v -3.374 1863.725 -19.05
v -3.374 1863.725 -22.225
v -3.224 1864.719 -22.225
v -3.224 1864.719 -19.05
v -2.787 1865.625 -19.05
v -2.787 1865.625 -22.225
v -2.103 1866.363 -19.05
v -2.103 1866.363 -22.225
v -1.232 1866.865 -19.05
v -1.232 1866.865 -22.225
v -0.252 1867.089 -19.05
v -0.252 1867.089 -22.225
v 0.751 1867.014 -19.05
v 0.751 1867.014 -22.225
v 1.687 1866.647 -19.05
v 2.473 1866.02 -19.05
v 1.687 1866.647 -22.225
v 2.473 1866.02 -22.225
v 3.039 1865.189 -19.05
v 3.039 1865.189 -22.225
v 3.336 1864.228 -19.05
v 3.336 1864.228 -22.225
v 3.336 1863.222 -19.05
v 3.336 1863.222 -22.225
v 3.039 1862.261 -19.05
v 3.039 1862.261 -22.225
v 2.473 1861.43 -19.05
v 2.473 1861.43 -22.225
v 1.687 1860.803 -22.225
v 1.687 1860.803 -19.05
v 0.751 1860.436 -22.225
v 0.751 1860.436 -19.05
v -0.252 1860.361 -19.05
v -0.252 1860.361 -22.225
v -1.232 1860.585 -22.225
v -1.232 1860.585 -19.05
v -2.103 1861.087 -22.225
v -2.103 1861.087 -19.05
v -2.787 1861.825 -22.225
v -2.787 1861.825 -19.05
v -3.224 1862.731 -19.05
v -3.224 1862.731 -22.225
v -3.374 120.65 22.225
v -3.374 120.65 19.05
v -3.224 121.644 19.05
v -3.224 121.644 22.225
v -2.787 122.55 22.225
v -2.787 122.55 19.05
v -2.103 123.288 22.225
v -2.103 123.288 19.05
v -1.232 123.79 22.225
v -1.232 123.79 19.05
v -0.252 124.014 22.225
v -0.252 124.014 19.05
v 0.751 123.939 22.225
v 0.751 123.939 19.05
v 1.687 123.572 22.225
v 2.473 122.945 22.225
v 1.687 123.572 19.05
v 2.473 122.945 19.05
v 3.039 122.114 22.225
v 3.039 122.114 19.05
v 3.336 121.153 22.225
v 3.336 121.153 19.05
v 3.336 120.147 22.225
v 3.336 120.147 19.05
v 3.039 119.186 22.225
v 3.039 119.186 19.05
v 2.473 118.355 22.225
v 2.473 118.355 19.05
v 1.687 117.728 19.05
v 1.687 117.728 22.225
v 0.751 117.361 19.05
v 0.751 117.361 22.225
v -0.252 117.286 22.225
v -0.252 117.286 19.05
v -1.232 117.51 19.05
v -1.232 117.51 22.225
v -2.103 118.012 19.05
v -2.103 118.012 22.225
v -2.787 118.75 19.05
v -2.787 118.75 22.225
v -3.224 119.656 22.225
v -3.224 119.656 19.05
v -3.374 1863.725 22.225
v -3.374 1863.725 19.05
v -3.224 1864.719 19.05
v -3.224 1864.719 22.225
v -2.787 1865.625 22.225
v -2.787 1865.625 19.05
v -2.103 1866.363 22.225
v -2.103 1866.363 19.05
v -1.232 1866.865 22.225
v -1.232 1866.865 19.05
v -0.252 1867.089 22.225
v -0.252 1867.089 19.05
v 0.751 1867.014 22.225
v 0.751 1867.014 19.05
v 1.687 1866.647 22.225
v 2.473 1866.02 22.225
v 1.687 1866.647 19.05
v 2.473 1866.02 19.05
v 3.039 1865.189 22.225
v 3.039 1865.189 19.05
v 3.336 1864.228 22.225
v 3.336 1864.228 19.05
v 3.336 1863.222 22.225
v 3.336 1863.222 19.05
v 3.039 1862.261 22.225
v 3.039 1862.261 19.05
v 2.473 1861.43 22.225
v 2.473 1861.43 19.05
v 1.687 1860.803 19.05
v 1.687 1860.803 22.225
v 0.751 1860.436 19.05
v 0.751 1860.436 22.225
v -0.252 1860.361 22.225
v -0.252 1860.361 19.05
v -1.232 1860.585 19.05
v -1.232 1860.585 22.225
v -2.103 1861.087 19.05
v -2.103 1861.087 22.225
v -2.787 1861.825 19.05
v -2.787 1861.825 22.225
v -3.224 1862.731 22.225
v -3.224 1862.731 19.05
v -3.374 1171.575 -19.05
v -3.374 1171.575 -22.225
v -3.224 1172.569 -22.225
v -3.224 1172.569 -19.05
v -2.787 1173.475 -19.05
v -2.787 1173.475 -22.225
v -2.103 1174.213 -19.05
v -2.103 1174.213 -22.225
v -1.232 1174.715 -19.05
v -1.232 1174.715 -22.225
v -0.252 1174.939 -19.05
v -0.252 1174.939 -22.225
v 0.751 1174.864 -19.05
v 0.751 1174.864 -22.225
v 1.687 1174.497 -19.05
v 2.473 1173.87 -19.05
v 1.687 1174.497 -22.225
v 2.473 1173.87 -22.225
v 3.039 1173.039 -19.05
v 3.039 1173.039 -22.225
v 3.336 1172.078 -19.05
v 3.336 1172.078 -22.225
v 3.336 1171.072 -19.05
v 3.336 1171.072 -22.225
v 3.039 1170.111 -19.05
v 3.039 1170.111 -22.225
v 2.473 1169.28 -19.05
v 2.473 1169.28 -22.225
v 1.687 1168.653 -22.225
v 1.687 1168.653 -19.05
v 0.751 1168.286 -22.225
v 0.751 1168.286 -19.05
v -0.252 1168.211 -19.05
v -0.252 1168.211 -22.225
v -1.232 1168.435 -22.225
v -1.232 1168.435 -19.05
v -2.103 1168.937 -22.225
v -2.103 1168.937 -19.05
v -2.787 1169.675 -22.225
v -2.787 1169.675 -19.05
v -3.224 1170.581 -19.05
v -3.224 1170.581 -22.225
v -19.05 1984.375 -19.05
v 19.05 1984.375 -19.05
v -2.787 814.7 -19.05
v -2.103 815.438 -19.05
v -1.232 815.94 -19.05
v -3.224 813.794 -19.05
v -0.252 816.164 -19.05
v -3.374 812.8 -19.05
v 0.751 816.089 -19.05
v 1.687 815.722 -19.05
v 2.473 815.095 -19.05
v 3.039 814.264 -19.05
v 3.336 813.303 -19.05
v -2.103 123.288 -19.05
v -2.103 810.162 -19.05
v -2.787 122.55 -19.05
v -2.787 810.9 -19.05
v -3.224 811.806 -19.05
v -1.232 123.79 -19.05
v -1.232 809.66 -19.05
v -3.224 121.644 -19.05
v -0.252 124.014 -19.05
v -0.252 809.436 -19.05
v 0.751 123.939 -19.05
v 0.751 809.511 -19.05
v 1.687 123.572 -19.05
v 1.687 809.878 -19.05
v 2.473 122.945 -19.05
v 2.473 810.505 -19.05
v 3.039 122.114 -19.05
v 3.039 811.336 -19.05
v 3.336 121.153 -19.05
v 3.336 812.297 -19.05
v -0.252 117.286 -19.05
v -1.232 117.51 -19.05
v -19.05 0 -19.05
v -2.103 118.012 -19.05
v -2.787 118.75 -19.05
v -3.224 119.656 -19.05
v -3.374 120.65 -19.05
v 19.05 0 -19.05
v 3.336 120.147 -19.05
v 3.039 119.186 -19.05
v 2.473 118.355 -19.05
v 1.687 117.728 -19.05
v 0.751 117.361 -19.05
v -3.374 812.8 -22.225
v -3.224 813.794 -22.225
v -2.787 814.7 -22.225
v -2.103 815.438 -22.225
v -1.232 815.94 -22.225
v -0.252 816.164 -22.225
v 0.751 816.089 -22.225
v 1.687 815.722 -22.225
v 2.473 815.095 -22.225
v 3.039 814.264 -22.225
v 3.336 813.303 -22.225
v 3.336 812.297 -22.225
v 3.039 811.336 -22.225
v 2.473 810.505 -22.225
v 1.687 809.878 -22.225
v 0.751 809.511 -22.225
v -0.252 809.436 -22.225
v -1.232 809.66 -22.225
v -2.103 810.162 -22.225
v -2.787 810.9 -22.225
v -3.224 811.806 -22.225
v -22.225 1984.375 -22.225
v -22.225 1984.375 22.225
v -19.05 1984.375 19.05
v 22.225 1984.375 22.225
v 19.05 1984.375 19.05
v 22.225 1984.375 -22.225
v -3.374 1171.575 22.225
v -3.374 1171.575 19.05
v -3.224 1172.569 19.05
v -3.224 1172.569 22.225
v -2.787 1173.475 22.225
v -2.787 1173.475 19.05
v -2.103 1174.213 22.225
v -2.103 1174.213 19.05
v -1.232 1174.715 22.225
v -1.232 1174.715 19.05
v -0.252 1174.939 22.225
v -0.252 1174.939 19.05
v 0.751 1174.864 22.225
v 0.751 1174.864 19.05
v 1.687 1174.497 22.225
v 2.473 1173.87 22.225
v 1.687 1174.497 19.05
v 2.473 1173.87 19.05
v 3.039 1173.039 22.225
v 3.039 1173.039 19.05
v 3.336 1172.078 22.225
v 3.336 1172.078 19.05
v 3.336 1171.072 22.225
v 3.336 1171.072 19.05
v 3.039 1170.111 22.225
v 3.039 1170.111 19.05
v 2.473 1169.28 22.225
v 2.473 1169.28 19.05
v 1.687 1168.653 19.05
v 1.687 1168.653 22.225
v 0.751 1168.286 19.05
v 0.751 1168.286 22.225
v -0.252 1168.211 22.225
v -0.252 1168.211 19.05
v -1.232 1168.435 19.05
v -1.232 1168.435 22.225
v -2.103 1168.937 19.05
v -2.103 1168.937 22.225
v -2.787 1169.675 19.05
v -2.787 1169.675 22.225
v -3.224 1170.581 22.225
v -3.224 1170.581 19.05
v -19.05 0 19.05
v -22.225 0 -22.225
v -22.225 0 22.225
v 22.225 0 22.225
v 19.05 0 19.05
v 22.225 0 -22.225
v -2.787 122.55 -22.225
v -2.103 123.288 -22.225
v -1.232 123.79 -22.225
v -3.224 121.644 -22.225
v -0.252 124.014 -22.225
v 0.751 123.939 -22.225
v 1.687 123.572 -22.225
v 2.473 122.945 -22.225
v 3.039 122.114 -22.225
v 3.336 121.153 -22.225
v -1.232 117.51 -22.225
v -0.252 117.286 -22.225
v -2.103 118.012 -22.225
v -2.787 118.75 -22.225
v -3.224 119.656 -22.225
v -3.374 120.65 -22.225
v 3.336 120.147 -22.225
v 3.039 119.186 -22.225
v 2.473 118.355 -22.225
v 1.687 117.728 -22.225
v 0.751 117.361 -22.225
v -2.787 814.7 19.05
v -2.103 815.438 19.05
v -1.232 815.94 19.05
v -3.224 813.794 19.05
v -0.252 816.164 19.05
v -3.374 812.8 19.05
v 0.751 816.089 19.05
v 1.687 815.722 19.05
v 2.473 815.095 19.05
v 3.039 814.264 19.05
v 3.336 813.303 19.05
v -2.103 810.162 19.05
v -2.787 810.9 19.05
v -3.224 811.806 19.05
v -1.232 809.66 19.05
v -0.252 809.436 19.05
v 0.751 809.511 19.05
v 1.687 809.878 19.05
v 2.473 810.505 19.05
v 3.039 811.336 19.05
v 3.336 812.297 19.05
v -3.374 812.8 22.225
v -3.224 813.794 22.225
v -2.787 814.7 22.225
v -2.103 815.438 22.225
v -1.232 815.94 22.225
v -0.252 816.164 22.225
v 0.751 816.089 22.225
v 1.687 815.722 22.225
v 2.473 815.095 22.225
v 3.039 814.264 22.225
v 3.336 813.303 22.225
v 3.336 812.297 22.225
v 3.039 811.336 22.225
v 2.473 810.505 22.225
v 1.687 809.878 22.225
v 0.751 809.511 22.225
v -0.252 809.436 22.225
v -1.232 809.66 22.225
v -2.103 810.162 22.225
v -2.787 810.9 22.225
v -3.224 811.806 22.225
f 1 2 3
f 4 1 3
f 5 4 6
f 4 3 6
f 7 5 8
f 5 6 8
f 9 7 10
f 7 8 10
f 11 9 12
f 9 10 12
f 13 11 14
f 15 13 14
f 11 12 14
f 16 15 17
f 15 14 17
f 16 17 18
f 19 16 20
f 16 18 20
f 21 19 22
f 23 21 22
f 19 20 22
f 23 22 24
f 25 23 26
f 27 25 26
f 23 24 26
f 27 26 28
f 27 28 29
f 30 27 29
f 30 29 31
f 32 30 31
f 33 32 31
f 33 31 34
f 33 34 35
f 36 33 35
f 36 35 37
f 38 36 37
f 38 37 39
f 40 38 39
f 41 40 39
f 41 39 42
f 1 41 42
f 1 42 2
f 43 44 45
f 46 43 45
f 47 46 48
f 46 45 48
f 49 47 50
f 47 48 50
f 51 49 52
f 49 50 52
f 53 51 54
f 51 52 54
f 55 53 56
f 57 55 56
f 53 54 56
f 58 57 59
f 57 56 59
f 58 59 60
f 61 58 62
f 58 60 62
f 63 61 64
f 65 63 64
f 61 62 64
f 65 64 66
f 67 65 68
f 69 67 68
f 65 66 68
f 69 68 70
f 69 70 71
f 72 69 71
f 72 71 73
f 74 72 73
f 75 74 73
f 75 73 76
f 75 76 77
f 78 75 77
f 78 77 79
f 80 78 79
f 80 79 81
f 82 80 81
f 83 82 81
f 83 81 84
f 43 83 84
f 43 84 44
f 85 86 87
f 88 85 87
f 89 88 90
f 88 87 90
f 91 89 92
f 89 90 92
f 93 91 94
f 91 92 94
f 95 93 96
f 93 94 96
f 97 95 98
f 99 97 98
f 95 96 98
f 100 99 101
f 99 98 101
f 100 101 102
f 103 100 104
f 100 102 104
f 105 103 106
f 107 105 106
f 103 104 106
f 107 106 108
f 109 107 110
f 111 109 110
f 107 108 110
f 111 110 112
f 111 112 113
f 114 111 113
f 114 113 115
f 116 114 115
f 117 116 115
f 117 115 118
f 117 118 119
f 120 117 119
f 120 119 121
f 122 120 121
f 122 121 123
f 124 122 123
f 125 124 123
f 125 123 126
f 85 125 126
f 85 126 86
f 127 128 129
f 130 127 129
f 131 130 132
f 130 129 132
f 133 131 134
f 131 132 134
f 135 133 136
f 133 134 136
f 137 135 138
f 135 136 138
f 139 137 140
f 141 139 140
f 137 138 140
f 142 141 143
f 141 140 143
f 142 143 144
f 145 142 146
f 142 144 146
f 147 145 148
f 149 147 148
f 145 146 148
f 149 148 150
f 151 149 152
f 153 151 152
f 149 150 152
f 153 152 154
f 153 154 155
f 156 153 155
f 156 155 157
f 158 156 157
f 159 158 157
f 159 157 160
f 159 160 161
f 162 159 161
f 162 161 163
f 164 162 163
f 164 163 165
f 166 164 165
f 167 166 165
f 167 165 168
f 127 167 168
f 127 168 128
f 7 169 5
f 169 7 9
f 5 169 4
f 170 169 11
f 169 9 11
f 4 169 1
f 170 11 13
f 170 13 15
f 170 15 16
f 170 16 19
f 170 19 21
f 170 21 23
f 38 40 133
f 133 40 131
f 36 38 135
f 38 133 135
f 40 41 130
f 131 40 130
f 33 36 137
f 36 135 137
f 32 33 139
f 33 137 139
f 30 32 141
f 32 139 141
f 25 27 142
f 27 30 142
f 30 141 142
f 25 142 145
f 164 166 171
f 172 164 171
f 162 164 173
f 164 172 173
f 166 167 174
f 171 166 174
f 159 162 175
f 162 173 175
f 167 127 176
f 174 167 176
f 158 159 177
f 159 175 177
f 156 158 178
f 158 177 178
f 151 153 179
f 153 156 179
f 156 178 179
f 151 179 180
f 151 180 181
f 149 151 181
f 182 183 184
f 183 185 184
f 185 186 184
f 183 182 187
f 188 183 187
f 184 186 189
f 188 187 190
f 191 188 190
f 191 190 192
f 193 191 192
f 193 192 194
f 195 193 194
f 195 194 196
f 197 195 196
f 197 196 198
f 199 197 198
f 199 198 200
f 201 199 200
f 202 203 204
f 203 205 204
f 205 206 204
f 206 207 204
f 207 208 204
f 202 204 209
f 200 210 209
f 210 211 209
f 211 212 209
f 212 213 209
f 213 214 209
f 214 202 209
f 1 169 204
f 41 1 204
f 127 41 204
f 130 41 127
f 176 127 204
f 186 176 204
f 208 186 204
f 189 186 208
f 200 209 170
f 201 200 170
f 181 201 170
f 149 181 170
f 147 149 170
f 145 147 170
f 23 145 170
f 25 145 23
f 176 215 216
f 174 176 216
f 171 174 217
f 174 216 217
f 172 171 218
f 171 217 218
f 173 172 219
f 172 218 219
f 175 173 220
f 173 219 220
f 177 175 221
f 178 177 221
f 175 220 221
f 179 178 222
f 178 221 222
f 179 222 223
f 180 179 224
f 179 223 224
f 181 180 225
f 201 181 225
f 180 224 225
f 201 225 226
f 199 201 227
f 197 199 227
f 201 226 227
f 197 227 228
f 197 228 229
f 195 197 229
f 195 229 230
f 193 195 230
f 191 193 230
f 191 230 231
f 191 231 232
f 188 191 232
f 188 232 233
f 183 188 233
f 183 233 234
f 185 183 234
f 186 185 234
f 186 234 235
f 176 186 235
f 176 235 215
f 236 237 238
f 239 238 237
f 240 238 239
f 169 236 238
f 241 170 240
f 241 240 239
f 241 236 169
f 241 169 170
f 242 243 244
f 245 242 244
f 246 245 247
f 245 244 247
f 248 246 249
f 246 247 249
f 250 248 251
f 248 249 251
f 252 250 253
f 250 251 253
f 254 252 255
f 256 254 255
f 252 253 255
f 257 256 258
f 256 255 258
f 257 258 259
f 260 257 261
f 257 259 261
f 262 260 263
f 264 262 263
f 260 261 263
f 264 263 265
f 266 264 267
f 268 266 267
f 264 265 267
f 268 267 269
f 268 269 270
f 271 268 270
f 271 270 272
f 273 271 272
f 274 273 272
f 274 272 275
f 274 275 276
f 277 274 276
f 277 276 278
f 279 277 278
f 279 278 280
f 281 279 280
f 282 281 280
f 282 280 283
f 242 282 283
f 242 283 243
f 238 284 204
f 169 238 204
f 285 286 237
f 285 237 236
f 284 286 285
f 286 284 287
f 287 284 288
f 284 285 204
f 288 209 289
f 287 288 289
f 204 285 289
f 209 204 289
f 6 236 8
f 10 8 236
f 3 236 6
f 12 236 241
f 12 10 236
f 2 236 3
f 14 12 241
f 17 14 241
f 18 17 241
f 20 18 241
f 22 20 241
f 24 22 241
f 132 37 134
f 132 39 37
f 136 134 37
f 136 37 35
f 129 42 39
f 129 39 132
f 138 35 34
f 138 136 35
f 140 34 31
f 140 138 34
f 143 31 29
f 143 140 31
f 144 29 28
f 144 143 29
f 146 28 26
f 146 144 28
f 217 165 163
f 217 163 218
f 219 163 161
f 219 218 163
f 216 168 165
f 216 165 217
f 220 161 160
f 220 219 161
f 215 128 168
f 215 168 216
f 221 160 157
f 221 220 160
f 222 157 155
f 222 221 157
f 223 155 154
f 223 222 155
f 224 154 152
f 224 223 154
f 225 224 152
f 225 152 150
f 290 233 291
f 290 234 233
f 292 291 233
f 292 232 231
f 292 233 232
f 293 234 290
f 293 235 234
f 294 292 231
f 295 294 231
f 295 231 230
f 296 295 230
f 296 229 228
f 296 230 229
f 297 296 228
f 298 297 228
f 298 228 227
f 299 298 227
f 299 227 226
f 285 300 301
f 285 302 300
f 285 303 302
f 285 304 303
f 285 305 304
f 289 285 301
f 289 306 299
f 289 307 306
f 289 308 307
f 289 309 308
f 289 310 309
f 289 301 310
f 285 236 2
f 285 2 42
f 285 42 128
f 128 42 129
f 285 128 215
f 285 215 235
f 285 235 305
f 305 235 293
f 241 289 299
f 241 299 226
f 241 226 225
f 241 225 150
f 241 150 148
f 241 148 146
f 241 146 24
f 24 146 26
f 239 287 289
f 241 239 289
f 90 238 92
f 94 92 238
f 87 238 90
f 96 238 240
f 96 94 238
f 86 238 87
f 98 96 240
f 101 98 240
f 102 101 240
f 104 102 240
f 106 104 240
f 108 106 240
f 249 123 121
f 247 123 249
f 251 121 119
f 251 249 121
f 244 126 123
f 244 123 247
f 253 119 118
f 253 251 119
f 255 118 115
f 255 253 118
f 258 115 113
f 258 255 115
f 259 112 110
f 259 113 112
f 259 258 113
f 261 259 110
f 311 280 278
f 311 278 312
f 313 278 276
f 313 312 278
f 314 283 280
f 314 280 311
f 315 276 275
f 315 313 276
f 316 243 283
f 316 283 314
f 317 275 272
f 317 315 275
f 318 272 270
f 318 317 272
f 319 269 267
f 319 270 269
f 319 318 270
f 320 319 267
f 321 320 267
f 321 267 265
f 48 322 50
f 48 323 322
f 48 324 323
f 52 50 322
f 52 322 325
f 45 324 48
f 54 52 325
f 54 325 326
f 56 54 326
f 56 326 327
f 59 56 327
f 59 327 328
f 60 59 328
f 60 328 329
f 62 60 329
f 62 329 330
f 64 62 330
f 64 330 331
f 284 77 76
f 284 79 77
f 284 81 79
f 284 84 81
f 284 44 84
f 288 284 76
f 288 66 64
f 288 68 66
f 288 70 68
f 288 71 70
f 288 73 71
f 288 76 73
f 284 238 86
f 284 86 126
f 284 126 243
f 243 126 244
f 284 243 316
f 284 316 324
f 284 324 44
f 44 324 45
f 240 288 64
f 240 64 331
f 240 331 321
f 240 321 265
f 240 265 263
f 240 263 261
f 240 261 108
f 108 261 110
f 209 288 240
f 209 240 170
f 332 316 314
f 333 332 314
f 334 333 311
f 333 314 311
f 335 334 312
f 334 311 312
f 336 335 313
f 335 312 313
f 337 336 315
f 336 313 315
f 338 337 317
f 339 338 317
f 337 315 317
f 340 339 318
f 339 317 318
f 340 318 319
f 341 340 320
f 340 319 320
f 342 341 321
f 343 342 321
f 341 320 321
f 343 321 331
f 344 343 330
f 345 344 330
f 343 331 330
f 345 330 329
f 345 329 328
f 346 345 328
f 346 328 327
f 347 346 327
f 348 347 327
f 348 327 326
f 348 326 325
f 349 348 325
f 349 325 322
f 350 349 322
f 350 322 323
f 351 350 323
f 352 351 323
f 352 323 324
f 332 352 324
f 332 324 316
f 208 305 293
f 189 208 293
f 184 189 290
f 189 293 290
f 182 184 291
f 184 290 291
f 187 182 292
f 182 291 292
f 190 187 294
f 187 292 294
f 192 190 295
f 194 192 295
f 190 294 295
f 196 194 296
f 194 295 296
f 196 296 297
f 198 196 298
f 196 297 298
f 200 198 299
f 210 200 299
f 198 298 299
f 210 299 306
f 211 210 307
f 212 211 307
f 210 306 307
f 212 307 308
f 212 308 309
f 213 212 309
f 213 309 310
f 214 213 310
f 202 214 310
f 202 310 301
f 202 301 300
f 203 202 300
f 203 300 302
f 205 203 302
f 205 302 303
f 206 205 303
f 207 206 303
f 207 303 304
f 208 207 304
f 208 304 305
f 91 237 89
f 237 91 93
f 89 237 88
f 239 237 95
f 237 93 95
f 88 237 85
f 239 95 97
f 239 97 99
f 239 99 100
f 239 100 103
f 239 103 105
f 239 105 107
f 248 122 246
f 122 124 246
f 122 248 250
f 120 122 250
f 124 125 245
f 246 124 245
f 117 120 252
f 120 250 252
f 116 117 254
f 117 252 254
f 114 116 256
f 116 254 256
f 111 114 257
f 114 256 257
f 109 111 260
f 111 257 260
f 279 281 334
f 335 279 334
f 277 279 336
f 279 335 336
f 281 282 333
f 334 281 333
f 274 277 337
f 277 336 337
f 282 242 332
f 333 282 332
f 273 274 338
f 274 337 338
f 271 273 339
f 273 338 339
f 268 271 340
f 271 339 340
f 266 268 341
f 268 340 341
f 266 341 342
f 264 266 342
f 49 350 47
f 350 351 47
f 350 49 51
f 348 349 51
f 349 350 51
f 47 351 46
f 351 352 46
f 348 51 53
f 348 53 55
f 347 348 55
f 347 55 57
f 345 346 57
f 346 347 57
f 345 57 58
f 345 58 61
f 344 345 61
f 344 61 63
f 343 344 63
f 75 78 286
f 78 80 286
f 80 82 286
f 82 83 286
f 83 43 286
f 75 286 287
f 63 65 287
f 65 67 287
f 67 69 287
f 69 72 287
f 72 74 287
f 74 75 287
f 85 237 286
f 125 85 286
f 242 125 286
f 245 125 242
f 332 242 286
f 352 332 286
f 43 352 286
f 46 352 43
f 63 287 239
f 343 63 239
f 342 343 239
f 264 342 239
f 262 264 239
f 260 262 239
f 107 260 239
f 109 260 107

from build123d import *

# Parameters (mm, degrees)
SKETCH1_W                        = 44.45
SKETCH1_H                        = 44.45
SKETCH1_W_2                      = 38.1
SKETCH1_H_2                      = 38.1
BOSS_EXTRUDE1_DEPTH              = 1984.375
F_17_64_0_26563_DIAMETER_HOLE1_D = 6.747002


with BuildPart() as part:
    # Sketch1 → Boss-Extrude1 (new body)
    with BuildSketch(Plane(origin=(0, 0, 0), x_dir=(1, 0, 0), z_dir=(0, 1, 0))):
        Rectangle(SKETCH1_W, SKETCH1_H)
        Rectangle(SKETCH1_W_2, SKETCH1_H_2, mode=Mode.SUBTRACT)
    extrude(amount=BOSS_EXTRUDE1_DEPTH)

    # 17/64 (0.26563) Diameter Hole1 (through all)
    with Locations(Plane.XY.offset(22.225)):
        with Locations((0, 812.8), (0, 120.65), (0, 1171.575), (0, 1863.725)):
            Hole(F_17_64_0_26563_DIAMETER_HOLE1_D / 2)


solid = part.part
